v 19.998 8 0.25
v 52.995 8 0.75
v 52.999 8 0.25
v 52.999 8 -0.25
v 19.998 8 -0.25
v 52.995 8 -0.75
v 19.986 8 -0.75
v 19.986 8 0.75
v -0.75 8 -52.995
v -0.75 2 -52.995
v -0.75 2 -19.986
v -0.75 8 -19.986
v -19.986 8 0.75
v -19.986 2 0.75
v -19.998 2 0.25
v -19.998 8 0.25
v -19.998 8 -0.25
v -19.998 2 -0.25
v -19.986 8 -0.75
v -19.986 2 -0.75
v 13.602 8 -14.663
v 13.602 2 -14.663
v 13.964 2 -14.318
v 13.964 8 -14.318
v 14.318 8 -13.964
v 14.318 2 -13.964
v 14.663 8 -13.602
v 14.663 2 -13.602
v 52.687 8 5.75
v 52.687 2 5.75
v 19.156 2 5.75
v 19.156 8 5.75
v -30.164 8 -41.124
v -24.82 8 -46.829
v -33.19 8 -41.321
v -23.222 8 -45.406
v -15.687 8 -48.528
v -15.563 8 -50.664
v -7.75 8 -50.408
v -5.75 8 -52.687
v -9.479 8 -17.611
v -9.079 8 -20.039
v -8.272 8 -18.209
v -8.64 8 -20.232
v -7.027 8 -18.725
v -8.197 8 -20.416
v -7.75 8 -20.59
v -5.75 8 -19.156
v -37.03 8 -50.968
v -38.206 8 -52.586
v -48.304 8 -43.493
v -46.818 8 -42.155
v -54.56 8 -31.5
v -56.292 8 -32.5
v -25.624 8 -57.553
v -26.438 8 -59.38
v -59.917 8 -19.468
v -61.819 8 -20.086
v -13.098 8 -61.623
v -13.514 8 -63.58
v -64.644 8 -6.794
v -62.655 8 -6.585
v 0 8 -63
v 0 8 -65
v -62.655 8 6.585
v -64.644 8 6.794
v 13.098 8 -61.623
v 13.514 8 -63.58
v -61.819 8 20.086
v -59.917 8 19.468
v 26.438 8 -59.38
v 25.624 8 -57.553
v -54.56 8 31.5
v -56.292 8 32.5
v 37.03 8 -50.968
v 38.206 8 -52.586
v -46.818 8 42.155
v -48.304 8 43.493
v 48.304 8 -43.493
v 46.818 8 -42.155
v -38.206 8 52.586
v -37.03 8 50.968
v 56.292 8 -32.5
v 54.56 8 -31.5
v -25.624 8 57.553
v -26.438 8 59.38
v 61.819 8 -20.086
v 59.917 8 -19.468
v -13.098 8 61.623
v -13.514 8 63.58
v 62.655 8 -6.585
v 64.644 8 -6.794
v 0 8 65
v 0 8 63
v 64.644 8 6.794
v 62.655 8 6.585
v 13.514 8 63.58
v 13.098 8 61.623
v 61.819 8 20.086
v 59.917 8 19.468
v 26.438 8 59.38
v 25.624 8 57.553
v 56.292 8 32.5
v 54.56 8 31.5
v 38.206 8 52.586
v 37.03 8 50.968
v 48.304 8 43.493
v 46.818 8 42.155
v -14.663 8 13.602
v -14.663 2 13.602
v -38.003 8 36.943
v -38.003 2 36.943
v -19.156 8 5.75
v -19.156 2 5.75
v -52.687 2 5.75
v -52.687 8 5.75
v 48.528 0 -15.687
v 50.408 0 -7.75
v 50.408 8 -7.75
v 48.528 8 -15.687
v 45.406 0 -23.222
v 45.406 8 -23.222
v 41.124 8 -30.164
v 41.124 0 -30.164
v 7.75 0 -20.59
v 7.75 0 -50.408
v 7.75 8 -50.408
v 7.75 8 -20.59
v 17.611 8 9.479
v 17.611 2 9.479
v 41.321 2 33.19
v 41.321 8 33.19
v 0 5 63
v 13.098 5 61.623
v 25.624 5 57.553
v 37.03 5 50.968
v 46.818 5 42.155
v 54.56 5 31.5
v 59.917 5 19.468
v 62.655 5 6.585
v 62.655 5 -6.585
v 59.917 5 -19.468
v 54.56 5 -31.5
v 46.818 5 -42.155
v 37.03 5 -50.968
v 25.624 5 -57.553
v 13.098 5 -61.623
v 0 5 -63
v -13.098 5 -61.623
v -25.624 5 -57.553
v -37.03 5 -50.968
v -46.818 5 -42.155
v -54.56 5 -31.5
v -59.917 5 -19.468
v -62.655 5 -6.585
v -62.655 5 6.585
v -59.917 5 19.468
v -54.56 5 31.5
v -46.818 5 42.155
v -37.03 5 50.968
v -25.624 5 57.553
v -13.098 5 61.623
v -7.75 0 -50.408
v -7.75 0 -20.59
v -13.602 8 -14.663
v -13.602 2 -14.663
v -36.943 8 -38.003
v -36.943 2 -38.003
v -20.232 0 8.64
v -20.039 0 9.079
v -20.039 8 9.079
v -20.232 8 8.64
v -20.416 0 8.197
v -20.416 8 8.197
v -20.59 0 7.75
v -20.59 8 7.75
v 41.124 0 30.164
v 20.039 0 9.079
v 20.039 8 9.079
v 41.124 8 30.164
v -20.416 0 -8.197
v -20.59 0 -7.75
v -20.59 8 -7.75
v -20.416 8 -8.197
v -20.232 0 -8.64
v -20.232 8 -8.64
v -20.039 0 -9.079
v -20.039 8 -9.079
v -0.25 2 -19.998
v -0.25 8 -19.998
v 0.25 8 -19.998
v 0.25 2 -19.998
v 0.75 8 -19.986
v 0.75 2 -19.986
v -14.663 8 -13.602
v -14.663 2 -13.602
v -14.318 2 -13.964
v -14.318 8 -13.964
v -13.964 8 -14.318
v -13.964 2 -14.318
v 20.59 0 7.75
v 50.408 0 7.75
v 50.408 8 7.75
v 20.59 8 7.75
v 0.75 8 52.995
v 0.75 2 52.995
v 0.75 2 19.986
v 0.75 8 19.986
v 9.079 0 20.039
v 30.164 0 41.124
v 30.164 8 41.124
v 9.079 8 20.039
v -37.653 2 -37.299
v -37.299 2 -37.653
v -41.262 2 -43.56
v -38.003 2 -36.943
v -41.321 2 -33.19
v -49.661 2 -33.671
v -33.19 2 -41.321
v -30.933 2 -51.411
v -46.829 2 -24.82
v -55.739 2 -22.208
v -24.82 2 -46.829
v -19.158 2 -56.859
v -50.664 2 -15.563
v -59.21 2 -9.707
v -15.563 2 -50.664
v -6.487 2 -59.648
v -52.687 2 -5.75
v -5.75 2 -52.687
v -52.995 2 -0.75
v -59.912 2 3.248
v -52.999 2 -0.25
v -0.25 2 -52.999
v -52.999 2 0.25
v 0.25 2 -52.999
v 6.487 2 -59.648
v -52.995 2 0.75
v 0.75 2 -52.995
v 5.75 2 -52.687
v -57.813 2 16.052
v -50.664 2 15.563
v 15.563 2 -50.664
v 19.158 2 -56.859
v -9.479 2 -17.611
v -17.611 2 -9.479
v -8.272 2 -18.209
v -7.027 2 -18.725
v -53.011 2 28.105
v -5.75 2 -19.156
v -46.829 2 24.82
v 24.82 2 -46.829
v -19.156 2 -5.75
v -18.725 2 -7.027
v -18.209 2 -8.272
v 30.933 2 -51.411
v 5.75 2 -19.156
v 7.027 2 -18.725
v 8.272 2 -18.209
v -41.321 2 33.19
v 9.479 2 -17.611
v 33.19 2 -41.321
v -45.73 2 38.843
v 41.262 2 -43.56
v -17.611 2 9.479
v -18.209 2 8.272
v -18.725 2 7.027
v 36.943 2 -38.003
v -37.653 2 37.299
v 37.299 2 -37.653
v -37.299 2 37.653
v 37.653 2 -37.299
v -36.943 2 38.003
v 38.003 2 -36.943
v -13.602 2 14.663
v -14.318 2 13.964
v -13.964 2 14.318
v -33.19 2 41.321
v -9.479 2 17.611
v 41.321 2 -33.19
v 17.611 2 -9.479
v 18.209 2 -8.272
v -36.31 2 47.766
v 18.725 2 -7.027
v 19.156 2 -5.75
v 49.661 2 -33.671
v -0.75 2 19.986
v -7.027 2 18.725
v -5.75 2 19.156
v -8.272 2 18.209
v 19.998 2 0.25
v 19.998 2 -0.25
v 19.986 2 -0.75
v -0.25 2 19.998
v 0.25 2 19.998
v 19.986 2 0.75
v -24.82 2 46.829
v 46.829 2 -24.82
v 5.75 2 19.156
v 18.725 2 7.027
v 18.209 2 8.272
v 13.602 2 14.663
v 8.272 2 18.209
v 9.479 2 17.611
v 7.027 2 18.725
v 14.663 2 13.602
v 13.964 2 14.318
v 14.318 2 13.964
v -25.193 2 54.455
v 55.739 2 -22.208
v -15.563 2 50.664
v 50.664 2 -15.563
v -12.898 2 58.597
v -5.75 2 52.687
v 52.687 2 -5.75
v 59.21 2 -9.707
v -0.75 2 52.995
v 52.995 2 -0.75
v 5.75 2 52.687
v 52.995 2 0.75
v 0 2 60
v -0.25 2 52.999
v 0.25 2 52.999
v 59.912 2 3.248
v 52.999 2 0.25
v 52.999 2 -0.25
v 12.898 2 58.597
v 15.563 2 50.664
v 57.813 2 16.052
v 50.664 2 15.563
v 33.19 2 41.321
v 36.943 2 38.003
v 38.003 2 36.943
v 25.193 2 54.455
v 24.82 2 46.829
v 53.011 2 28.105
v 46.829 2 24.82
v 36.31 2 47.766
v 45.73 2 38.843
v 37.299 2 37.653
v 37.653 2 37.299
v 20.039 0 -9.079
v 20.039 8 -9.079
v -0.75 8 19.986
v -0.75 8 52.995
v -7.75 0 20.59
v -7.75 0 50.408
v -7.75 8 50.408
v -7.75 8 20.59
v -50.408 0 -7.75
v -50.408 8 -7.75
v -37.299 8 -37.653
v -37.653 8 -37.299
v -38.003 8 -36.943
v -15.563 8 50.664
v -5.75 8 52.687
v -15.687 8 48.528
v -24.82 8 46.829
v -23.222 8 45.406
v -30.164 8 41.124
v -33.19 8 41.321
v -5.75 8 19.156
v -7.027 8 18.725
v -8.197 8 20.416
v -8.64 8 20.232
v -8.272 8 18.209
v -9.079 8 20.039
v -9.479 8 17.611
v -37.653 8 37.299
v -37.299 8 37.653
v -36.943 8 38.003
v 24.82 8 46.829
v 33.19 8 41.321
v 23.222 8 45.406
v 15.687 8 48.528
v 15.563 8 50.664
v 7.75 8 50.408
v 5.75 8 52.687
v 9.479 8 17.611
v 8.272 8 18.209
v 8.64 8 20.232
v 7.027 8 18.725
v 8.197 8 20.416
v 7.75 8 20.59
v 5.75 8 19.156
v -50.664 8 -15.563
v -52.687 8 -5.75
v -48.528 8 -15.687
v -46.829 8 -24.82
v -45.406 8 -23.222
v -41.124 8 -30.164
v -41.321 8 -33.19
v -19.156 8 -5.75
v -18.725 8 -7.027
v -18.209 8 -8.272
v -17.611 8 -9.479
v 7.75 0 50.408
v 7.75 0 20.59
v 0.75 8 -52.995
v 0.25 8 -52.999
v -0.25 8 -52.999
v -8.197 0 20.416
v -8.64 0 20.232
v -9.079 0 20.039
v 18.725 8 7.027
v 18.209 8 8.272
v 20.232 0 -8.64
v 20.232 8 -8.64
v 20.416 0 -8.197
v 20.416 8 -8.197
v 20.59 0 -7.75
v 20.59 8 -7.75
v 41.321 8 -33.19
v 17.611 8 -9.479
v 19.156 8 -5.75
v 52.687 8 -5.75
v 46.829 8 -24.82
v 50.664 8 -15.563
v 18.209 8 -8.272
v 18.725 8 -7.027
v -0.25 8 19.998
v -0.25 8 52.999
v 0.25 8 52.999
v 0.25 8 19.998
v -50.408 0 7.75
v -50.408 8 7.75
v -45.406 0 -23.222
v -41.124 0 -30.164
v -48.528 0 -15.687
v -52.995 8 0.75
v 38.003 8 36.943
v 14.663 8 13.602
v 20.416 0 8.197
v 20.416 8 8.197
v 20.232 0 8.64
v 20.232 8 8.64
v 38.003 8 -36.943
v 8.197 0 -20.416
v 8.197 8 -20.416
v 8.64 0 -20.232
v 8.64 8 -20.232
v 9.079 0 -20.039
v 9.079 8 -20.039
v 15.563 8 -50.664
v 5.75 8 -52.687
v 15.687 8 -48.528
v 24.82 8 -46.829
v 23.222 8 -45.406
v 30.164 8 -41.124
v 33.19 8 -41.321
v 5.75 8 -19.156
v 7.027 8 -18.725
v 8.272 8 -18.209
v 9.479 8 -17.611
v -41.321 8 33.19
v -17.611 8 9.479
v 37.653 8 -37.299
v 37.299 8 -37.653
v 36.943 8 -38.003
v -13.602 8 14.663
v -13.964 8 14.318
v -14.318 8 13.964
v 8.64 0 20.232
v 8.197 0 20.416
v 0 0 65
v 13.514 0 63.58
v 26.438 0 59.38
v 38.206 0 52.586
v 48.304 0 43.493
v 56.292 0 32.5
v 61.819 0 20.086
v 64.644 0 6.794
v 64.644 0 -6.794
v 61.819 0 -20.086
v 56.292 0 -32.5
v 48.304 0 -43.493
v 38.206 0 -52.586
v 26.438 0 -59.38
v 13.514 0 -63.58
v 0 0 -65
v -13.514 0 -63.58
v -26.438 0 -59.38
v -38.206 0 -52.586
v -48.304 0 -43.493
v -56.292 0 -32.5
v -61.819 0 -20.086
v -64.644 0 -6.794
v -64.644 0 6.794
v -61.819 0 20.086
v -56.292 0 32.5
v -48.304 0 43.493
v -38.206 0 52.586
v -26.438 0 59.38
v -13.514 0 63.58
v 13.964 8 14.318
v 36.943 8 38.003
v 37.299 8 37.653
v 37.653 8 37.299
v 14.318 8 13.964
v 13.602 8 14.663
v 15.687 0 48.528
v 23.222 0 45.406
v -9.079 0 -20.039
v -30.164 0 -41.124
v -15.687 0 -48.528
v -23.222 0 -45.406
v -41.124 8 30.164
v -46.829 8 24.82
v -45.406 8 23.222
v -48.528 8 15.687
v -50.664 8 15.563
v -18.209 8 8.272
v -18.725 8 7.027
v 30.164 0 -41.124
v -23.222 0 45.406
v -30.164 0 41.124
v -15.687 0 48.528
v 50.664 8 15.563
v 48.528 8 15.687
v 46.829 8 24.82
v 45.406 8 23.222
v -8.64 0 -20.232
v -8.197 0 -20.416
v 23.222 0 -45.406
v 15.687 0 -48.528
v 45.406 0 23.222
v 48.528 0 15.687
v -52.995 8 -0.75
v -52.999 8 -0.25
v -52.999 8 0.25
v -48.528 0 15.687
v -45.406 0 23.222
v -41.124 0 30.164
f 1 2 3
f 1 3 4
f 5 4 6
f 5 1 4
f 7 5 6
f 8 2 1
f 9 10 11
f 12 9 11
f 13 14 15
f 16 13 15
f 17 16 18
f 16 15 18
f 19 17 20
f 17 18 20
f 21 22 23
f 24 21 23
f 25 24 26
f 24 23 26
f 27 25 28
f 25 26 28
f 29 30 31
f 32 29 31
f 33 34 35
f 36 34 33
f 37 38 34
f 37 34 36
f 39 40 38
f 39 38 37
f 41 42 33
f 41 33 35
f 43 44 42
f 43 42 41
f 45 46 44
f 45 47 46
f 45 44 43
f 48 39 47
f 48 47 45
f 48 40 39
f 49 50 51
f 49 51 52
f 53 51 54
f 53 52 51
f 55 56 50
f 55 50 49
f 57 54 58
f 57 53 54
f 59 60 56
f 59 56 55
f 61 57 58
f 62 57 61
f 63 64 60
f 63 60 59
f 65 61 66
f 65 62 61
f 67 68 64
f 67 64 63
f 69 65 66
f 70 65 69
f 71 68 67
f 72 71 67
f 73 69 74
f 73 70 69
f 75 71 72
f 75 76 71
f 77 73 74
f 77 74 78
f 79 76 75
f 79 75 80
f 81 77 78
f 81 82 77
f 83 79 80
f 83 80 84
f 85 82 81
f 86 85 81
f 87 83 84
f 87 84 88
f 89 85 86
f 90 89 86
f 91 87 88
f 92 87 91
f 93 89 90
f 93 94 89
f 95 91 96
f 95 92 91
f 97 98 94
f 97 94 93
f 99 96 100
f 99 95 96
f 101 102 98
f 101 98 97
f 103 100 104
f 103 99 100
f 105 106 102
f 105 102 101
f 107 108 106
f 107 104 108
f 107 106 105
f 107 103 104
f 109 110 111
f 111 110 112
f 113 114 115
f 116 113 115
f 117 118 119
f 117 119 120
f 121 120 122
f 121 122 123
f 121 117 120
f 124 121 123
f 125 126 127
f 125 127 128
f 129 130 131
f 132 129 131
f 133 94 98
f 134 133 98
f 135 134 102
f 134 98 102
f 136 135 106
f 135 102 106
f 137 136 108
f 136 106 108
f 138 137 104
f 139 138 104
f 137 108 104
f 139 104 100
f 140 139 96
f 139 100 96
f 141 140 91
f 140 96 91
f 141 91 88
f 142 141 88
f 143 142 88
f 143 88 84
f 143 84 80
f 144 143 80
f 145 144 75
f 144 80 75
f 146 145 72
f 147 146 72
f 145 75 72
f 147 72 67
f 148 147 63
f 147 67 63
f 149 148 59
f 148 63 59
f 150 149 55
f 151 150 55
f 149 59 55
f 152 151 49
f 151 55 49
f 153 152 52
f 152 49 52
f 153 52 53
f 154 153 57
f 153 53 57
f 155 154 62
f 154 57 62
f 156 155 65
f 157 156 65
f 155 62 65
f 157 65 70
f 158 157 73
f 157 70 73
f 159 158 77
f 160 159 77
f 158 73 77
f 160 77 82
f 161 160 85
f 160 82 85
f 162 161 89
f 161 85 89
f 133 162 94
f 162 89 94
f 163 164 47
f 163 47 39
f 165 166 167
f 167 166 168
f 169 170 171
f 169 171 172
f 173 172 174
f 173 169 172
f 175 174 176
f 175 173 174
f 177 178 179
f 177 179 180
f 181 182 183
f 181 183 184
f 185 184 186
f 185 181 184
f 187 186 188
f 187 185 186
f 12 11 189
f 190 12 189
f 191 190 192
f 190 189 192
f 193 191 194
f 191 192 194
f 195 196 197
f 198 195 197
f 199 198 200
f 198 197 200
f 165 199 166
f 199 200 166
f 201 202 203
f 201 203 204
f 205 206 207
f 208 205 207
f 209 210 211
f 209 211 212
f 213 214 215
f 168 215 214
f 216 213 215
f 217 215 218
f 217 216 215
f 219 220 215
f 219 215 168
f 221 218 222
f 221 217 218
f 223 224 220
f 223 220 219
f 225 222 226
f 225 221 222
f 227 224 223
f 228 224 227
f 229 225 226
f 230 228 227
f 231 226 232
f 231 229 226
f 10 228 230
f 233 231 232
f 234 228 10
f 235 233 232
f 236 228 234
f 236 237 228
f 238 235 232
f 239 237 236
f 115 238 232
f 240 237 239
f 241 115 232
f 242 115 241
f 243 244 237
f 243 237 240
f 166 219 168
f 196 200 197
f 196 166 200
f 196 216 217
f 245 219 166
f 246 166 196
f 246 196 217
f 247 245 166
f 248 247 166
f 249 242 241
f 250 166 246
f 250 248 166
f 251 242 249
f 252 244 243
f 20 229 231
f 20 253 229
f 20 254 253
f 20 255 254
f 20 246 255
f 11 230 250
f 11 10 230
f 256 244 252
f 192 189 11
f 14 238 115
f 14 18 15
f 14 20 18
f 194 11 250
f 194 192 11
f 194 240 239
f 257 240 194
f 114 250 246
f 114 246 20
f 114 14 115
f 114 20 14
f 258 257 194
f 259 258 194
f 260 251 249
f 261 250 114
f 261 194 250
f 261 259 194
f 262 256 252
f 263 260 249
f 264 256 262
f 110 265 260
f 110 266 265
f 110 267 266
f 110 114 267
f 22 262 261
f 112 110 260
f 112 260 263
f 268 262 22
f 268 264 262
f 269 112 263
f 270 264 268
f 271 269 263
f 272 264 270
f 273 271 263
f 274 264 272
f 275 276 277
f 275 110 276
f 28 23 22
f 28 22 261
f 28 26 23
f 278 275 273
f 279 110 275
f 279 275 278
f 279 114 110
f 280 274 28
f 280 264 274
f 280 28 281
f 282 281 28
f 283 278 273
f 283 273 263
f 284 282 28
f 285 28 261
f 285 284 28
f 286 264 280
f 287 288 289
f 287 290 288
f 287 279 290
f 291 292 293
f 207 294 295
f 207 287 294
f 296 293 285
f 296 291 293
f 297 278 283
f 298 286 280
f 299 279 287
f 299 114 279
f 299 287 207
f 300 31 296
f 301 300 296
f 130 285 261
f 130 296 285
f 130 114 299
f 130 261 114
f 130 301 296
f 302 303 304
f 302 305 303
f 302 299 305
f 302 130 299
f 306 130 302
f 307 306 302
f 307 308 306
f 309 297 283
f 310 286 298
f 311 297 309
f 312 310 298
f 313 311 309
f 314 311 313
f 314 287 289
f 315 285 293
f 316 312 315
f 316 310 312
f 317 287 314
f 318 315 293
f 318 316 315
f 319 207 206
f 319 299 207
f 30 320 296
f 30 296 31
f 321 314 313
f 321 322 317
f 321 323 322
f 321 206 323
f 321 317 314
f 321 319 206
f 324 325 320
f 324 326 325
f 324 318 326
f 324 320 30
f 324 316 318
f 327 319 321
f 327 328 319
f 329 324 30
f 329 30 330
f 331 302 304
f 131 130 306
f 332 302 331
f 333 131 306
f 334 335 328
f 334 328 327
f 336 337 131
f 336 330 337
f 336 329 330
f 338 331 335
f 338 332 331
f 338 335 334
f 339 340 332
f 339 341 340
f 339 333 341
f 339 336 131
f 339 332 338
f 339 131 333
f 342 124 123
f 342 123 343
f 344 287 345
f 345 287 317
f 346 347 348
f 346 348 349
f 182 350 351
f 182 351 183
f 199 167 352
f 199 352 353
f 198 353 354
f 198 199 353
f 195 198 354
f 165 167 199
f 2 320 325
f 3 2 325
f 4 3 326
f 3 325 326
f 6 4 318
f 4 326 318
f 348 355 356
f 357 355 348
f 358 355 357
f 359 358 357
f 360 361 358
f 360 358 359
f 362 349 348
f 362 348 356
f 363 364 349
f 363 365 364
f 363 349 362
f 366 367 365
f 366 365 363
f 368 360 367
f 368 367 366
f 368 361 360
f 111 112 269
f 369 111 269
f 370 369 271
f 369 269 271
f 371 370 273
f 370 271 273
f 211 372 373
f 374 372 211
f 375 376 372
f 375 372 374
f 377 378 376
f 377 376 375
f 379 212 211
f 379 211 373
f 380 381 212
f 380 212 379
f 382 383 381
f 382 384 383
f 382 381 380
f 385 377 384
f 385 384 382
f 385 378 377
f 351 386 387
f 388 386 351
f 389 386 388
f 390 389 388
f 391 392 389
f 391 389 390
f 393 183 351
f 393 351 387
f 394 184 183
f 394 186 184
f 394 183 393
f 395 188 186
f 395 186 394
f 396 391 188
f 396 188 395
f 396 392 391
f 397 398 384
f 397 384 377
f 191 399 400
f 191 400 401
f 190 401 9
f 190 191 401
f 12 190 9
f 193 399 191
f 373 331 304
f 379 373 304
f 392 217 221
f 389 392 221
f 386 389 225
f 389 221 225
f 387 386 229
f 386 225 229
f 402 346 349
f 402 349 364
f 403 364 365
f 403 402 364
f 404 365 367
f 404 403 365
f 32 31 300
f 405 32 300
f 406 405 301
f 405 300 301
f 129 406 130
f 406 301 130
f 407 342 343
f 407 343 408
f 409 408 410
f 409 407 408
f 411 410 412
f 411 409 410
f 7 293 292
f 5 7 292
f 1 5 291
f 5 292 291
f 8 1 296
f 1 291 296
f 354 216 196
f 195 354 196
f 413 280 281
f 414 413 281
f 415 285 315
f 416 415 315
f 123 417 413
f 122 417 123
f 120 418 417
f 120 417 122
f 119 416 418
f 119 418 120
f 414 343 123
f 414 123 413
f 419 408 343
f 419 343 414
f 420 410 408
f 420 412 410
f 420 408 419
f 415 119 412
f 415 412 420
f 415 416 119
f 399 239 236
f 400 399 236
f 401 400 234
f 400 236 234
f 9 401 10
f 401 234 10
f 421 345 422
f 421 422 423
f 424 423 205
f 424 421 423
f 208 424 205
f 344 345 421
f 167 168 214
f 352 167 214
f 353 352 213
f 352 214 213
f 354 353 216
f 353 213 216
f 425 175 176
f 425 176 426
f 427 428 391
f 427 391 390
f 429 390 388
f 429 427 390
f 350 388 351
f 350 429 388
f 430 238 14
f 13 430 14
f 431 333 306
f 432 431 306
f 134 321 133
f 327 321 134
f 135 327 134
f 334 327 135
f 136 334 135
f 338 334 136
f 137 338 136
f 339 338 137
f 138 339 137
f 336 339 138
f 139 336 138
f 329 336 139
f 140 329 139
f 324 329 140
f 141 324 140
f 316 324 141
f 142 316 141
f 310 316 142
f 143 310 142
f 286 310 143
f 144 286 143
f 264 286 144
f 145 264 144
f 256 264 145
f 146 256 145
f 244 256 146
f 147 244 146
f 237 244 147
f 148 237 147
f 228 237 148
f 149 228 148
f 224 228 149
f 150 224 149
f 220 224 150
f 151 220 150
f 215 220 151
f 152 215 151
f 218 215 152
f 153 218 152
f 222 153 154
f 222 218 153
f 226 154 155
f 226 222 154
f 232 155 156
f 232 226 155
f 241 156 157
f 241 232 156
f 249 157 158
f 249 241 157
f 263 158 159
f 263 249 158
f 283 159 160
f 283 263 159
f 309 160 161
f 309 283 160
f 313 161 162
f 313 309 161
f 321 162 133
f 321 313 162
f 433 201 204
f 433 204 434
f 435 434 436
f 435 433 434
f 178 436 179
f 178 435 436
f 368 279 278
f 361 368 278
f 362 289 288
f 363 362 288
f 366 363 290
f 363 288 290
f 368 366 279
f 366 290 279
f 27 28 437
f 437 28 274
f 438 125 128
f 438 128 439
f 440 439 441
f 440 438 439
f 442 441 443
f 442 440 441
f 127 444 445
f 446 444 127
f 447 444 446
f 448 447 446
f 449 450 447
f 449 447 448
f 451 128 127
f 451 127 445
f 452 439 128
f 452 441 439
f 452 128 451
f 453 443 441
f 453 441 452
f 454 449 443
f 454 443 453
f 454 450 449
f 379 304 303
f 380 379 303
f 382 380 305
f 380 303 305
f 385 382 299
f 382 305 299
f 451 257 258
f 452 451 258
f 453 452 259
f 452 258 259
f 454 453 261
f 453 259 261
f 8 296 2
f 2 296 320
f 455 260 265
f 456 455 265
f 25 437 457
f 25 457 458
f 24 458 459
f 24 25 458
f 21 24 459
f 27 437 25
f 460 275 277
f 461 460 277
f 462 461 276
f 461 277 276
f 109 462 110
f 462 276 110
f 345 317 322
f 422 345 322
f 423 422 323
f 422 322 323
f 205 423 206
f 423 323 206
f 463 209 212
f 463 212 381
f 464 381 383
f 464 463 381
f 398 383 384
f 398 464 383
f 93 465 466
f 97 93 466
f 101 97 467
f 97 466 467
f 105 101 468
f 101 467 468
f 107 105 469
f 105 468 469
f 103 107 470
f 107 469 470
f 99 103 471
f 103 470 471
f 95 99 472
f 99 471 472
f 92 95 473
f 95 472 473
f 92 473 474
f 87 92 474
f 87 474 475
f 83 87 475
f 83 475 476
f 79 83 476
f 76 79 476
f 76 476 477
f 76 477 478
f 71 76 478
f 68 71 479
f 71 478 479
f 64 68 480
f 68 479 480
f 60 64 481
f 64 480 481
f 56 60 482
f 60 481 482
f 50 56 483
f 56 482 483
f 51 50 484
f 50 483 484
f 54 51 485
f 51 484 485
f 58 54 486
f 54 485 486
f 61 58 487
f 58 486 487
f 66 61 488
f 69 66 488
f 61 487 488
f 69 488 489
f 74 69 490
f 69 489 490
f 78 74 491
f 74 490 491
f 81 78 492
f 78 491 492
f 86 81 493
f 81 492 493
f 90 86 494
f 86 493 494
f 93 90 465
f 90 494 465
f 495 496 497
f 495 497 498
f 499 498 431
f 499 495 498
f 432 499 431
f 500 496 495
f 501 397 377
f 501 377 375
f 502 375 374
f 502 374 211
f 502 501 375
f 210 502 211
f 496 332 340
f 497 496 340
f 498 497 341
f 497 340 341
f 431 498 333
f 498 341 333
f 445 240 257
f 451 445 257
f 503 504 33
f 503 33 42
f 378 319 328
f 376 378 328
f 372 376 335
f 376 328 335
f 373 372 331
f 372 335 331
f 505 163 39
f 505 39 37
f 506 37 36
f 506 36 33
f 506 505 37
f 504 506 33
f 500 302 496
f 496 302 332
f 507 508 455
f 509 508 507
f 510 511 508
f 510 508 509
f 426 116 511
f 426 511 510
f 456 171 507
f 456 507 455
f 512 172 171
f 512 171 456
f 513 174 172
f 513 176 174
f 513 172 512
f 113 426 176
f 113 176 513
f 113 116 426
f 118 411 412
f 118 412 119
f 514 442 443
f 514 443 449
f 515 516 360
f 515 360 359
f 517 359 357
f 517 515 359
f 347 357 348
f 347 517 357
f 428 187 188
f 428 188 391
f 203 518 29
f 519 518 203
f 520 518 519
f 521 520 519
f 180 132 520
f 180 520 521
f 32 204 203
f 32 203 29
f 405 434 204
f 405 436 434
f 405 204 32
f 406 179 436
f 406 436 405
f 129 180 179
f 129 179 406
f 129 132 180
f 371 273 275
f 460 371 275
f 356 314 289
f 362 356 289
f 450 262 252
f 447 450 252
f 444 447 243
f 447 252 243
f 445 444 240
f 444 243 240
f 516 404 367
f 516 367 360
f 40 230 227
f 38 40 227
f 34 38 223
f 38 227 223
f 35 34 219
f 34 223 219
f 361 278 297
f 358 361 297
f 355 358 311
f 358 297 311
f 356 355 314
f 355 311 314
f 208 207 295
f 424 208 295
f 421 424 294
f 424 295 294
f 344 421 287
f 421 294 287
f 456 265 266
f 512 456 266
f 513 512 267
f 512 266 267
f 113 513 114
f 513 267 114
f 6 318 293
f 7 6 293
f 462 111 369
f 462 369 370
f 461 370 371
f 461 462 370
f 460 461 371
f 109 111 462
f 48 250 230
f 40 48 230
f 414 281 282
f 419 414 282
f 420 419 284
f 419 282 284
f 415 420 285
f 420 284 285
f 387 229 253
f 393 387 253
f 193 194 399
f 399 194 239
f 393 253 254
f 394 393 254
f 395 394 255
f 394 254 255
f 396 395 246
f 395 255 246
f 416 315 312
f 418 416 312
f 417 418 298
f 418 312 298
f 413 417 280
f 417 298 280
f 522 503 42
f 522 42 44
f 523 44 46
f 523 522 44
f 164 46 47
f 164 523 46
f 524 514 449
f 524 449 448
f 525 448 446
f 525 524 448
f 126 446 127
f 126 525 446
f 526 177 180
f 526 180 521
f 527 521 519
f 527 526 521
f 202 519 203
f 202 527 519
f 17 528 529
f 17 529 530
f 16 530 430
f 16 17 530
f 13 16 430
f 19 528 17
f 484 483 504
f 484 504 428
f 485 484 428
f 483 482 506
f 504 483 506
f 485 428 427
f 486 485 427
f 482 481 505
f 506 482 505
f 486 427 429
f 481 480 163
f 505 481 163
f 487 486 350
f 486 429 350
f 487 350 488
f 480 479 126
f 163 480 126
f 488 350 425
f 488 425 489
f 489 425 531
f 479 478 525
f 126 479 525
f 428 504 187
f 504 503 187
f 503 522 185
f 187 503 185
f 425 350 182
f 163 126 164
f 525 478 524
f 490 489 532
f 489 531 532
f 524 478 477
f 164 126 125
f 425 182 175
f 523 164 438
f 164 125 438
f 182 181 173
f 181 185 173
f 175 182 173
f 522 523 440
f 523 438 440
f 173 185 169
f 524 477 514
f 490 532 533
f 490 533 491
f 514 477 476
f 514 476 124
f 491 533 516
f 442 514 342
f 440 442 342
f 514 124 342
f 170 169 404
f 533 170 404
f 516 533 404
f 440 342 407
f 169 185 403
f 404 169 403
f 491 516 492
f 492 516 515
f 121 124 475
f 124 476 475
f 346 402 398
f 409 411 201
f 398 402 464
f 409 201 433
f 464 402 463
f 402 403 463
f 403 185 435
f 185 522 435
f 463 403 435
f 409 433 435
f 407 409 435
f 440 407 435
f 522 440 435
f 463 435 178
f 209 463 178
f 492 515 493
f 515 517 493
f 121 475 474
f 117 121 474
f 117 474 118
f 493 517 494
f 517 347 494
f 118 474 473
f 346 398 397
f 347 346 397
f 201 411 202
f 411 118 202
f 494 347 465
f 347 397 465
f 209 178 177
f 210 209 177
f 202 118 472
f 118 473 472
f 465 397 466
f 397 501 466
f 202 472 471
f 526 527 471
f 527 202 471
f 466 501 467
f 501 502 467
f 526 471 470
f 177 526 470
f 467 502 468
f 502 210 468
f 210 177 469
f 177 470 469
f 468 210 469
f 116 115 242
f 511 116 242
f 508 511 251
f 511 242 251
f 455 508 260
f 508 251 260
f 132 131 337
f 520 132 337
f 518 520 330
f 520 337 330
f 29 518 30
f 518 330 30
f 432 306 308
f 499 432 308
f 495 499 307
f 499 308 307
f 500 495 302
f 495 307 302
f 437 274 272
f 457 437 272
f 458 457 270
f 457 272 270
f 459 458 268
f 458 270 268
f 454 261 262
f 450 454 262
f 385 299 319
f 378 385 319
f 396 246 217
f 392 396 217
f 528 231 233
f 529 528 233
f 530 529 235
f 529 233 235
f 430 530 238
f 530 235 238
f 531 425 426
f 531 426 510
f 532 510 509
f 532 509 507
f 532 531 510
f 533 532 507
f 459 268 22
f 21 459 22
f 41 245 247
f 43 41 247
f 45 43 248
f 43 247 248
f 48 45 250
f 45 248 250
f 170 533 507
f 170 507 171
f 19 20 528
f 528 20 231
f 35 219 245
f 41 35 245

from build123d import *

# Parameters (mm, degrees)
ESQUISSE1_R                  = 65
BOSS_EXTRU_1_DEPTH           = 8
ESQUISSE2_R                  = 63
ENL_V_MAT_EXTRU_1_DEPTH      = 6
BOSS_EXTRU_2_DEPTH           = 6
R_P_TITION_CIRCULAIRE1_COUNT = 8
COQUE1_DEPTH                 = 8
CHAMFER1_SIZE                = 3


# Read off the part's stored shape, not the designer's step: Coque1
with BuildPart() as part:
    # Esquisse1 → Boss.-Extru.1 (new body)
    with BuildSketch(Plane(origin=(0, 0, 0), x_dir=(1, 0, 0), z_dir=(0, 1, 0))):
        with Locations(Location((0, 0, 0), (0, 0, 270))):
            Circle(ESQUISSE1_R)
    extrude(amount=BOSS_EXTRU_1_DEPTH)

    # Esquisse2 → Enlèv. mat.-Extru.1 (cut)
    with BuildSketch(Plane(origin=(0, 8, 0), x_dir=(1, 0, 0), z_dir=(0, 1, 0))):
        with Locations(Location((0, 0, 0), (0, 0, 270))):
            Circle(ESQUISSE2_R)
    extrude(amount=-ENL_V_MAT_EXTRU_1_DEPTH, mode=Mode.SUBTRACT)

    # Esquisse3 → Boss.-Extru.2 (add)
    with BuildSketch(Plane(origin=(0, 2, 0), x_dir=(1, 0, 0), z_dir=(0, 1, 0))):
        with BuildLine():
            Line((-41.321316613, -33.189588629), (-17.610927668, -9.479199685))
            ThreePointArc((-17.610927668, -9.479199685), (-18.47759065, -7.653668647), (-19.155612754, -5.75))
            Line((-19.155612754, -5.75), (-52.687166369, -5.75))
            ThreePointArc((-52.687166369, -5.75), (-48.965615223, -20.282221915), (-41.321316613, -33.189588629))
        make_face()
        with BuildLine():
            Line((-36.942576794, -38.003236965), (-13.60185835, -14.662518522))
            ThreePointArc((-13.60185835, -14.662518522), (-14.142135624, -14.142135624), (-14.662518522, -13.60185835))
            Line((-14.662518522, -13.60185835), (-38.003236965, -36.942576794))
            ThreePointArc((-38.003236965, -36.942576794), (-37.476659403, -37.476659403), (-36.942576794, -38.003236965))
        make_face()
    boss_extru_2 = extrude(amount=BOSS_EXTRU_2_DEPTH)

    # Répétition circulaire1: Boss.-Extru.2 ×8 about axis
    r_p_tition_circulaire1_axis = Axis((0, 0, 0), (0, 1, 0))
    for i in range(1, R_P_TITION_CIRCULAIRE1_COUNT):
        add(boss_extru_2.rotate(r_p_tition_circulaire1_axis, i * 360 / R_P_TITION_CIRCULAIRE1_COUNT))

    # Coque1 outline → Coque1 (cut)
    with BuildSketch(Plane(origin=(0, 0, 0), x_dir=(1, 0, 0), z_dir=(0, 1, 0))):
        with BuildLine():
            Line((-50.407712704, 7.75), (-20.589742592, 7.75))
            ThreePointArc((-20.589742592, 7.75), (-20.325349715, 8.419035512), (-20.039224164, 9.079069055))
            Line((-20.039224164, 9.079069055), (-41.123713031, 30.163557923))
            ThreePointArc((-41.123713031, 30.163557923), (-47.117856158, 19.516855051), (-50.407712704, 7.75))
        make_face()
        with BuildLine():
            Line((20.589742592, 7.75), (50.407712704, 7.75))
            ThreePointArc((50.407712704, 7.75), (47.117856158, 19.516855051), (41.123713031, 30.163557923))
            Line((41.123713031, 30.163557923), (20.039224164, 9.079069055))
            ThreePointArc((20.039224164, 9.079069055), (20.325349715, 8.419035512), (20.589742592, 7.75))
        make_face()
        with BuildLine():
            ThreePointArc((-7.75, 50.407712704), (-19.516855051, 47.117856158), (-30.163557923, 41.123713031))
            Line((-30.163557923, 41.123713031), (-9.079069055, 20.039224164))
            ThreePointArc((-9.079069055, 20.039224164), (-8.419035512, 20.325349715), (-7.75, 20.589742592))
            Line((-7.75, 20.589742592), (-7.75, 50.407712704))
        make_face()
        with BuildLine():
            ThreePointArc((30.163557923, 41.123713031), (19.516855051, 47.117856158), (7.75, 50.407712704))
            Line((7.75, 50.407712704), (7.75, 20.589742592))
            ThreePointArc((7.75, 20.589742592), (8.419035512, 20.325349715), (9.079069055, 20.039224164))
            Line((9.079069055, 20.039224164), (30.163557923, 41.123713031))
        make_face()
        with BuildLine():
            ThreePointArc((41.123713031, -30.163557923), (47.117856158, -19.516855051), (50.407712704, -7.75))
            Line((50.407712704, -7.75), (20.589742592, -7.75))
            ThreePointArc((20.589742592, -7.75), (20.325349715, -8.419035512), (20.039224164, -9.079069055))
            Line((20.039224164, -9.079069055), (41.123713031, -30.163557923))
        make_face()
        with BuildLine():
            ThreePointArc((7.75, -50.407712704), (19.516855051, -47.117856158), (30.163557923, -41.123713031))
            Line((30.163557923, -41.123713031), (9.079069055, -20.039224164))
            ThreePointArc((9.079069055, -20.039224164), (8.419035512, -20.325349715), (7.75, -20.589742592))
            Line((7.75, -20.589742592), (7.75, -50.407712704))
        make_face()
        with BuildLine():
            ThreePointArc((-30.163557923, -41.123713031), (-19.516855051, -47.117856158), (-7.75, -50.407712704))
            Line((-7.75, -50.407712704), (-7.75, -20.589742592))
            ThreePointArc((-7.75, -20.589742592), (-8.419035512, -20.325349715), (-9.079069055, -20.039224164))
            Line((-9.079069055, -20.039224164), (-30.163557923, -41.123713031))
        make_face()
        with BuildLine():
            ThreePointArc((-50.407712704, -7.75), (-47.117856158, -19.516855051), (-41.123713031, -30.163557923))
            Line((-41.123713031, -30.163557923), (-20.039224164, -9.079069055))
            ThreePointArc((-20.039224164, -9.079069055), (-20.325349715, -8.419035512), (-20.589742592, -7.75))
            Line((-20.589742592, -7.75), (-50.407712704, -7.75))
        make_face()
    extrude(amount=COQUE1_DEPTH, mode=Mode.SUBTRACT)

    # Chamfer1
    chamfer1_edges = [part.edges().sort_by_distance(p)[0] for p in [
        (0, 2, -63),
    ]]
    chamfer(chamfer1_edges, length=CHAMFER1_SIZE)


solid = part.part
